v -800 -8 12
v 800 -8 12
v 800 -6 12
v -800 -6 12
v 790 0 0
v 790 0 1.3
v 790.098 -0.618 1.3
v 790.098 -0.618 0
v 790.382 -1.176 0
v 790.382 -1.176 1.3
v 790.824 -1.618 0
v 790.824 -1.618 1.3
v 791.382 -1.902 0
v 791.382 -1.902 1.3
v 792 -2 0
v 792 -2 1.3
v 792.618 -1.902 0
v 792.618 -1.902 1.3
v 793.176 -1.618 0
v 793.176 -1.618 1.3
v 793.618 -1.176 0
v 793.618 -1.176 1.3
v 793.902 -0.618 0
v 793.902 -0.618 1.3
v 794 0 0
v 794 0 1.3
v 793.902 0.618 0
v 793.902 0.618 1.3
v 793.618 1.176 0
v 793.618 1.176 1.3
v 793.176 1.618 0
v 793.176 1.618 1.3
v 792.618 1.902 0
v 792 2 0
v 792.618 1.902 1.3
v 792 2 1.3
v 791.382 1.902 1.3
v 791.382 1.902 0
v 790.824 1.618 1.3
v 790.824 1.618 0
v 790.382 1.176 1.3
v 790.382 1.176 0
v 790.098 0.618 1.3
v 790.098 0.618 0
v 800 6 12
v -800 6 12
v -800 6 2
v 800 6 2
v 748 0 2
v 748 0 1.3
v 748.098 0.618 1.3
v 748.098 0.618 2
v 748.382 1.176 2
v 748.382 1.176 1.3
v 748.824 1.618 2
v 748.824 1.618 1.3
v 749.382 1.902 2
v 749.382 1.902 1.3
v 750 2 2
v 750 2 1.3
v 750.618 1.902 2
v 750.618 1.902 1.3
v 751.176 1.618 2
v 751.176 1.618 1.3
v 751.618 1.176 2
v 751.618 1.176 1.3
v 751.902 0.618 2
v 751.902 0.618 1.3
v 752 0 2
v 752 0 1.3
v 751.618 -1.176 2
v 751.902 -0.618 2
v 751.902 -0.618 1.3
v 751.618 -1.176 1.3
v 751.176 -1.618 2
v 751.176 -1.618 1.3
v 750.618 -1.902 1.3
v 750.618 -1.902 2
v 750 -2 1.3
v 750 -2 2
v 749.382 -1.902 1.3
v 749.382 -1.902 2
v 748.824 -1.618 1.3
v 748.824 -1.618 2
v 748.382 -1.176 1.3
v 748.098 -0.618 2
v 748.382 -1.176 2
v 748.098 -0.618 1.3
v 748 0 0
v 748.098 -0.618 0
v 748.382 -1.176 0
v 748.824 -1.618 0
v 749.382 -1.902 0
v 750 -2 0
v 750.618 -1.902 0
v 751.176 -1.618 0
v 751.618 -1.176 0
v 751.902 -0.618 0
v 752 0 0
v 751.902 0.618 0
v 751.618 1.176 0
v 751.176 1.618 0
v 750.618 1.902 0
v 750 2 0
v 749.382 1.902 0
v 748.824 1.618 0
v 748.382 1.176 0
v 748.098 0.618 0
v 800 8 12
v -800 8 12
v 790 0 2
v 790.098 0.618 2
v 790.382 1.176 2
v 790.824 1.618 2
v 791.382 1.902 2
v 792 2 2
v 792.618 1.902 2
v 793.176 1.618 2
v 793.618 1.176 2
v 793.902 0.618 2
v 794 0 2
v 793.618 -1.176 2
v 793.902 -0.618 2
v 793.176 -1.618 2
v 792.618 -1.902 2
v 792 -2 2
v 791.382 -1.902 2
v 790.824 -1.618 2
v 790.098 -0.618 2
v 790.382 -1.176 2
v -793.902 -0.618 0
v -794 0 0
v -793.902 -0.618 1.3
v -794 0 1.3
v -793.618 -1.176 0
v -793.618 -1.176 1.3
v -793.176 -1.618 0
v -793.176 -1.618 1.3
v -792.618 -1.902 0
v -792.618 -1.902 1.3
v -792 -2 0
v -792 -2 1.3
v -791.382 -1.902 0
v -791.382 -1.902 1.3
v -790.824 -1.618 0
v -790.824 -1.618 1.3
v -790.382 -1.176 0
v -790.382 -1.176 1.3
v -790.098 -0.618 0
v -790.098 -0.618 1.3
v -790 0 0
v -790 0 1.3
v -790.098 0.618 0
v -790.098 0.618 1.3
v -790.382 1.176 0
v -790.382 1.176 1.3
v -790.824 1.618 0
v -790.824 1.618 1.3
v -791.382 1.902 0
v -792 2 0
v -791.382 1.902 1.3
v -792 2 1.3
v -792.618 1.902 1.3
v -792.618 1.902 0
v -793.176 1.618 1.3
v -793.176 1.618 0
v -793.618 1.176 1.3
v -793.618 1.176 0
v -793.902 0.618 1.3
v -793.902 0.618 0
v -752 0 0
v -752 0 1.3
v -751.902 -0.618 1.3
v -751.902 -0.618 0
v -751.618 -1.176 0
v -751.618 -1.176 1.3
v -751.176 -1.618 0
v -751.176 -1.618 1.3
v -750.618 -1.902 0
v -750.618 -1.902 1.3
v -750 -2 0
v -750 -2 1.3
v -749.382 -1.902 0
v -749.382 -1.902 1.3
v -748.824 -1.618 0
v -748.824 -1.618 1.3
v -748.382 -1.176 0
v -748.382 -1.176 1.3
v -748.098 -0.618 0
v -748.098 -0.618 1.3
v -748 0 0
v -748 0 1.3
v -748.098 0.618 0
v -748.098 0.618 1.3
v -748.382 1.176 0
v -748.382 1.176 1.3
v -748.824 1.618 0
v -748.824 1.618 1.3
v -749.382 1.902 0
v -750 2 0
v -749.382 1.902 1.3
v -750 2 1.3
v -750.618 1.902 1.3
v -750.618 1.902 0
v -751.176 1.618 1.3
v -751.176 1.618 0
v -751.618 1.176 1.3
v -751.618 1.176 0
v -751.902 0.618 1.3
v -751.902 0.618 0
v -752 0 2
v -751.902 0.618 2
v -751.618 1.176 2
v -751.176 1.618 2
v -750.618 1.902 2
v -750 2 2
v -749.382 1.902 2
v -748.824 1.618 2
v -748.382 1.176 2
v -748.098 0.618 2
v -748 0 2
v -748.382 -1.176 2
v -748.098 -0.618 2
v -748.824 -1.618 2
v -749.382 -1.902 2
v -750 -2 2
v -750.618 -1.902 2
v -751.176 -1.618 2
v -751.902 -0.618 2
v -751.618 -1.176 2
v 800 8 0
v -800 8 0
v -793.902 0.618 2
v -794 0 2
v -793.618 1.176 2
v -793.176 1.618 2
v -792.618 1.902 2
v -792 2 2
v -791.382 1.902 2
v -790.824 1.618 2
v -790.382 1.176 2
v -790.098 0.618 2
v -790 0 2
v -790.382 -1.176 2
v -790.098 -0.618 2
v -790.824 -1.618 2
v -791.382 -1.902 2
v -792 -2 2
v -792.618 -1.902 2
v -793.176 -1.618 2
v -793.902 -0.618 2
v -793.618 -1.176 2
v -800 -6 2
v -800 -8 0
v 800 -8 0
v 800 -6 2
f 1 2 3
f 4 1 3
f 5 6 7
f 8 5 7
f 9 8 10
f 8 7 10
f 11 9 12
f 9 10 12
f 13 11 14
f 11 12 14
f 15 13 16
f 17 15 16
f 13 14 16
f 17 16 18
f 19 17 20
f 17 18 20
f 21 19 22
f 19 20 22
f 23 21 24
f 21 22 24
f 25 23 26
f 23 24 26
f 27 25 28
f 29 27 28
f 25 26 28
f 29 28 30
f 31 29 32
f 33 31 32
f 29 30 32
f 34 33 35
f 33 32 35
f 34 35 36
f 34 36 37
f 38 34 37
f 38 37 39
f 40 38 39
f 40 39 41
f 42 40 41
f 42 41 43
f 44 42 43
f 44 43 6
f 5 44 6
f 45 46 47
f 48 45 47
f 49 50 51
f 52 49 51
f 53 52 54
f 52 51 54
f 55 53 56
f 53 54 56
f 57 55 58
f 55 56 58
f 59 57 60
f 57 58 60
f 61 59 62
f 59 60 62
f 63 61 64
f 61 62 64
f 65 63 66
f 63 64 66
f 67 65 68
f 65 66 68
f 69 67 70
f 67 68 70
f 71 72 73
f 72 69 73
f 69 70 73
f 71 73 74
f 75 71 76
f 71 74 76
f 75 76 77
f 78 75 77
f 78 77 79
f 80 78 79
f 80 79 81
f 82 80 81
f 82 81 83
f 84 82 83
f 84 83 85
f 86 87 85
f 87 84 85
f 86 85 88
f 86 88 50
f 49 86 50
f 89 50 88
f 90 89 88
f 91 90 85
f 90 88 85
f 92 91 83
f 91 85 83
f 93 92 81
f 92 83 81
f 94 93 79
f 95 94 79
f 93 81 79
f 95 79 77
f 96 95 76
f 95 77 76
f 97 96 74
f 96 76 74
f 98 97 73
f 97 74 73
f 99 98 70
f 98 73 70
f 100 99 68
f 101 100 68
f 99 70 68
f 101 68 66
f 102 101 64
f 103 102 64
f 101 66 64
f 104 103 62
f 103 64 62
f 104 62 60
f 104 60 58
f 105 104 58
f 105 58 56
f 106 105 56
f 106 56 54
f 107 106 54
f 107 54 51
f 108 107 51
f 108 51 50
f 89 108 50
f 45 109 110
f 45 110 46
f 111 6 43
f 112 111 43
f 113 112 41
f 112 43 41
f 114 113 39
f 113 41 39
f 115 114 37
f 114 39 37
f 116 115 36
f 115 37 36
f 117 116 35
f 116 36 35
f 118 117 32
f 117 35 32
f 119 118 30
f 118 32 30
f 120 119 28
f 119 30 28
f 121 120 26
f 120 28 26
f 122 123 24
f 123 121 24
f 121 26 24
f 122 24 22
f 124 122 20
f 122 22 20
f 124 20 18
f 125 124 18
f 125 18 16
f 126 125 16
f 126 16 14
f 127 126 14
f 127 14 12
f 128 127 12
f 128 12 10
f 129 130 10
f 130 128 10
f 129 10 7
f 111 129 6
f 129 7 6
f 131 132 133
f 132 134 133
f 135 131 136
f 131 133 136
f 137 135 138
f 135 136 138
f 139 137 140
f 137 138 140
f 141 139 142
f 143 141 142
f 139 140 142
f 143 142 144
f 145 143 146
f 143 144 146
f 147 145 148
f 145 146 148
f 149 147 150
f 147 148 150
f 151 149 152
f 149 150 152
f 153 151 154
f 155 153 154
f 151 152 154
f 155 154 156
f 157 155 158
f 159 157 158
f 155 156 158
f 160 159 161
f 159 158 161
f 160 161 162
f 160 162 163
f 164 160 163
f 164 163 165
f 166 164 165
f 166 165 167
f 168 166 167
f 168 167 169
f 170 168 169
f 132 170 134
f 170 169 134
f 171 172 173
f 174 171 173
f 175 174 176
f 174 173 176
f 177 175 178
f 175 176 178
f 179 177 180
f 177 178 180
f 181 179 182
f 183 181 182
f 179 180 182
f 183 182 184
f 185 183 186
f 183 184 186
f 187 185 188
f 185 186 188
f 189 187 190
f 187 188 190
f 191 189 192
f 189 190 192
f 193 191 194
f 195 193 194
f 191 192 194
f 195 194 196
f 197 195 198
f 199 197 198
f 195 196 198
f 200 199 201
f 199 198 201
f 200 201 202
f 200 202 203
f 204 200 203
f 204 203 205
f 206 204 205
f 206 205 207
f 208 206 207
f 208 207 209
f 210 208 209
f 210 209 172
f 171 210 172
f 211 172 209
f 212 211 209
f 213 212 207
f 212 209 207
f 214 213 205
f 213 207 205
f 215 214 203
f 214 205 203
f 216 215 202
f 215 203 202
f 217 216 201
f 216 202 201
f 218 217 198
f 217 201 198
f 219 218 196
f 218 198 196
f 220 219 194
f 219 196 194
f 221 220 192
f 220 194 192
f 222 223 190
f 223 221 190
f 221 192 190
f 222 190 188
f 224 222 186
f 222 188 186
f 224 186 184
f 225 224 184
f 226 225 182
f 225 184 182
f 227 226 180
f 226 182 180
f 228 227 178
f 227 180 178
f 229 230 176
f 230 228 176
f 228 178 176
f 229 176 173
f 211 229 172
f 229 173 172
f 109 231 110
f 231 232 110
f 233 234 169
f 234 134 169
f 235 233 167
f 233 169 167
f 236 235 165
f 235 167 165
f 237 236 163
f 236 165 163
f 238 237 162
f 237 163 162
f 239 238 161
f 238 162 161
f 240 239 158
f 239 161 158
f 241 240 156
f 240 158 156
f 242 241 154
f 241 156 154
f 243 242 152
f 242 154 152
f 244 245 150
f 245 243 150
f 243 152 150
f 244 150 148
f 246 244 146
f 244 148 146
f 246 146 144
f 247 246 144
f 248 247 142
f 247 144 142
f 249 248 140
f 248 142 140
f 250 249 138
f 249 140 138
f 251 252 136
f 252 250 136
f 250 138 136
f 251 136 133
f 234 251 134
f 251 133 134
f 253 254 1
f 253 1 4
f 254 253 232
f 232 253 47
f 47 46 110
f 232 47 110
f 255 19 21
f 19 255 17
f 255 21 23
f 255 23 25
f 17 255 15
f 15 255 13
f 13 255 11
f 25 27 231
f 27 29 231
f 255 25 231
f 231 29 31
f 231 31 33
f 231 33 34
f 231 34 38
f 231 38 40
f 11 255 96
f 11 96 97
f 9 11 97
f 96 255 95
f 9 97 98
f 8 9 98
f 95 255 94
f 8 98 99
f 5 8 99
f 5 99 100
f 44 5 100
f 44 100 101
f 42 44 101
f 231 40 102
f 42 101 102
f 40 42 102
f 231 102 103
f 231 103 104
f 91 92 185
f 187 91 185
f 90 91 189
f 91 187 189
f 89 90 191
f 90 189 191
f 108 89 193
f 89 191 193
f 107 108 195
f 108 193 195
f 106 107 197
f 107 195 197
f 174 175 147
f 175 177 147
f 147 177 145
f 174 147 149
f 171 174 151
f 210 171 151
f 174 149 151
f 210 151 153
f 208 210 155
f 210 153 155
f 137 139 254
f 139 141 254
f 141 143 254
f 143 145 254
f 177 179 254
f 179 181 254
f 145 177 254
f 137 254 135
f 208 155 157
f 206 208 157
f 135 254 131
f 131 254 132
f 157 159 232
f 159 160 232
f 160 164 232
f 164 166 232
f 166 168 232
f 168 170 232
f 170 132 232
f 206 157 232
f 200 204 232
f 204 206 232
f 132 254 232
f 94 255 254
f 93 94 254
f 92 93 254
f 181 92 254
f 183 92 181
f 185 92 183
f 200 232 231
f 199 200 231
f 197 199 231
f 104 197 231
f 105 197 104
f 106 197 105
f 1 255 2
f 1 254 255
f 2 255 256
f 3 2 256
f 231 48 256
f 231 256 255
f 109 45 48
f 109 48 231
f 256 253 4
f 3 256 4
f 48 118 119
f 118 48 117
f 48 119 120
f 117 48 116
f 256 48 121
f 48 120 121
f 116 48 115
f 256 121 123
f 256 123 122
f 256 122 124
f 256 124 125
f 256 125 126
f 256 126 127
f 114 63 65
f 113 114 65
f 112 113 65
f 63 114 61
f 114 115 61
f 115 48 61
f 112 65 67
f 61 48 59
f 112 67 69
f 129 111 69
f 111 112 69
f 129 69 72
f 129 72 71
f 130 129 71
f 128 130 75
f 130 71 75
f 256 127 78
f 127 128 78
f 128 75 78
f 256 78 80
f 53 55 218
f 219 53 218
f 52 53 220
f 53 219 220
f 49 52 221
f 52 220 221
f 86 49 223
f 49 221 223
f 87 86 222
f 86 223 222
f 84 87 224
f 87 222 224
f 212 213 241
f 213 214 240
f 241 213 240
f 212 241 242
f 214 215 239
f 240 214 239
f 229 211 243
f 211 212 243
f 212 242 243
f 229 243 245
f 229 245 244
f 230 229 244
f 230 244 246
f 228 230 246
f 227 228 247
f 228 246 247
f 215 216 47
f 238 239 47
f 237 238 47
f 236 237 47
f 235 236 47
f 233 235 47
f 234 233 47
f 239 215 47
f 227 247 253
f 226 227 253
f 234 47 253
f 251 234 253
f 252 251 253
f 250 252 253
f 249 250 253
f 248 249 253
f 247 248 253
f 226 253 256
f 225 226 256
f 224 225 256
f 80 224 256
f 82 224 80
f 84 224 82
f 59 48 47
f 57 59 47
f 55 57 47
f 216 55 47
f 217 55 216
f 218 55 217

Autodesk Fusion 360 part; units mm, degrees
sketch "Sketch1" plane through (0, 0, 0) normal (1, 0, 0) x (0, 1, 0)
  line L0 (-8, 0) -> (8, 0)
  line L1 (8, 0) -> (8, 12)
  line L2 (8, 12) -> (6, 12)
  line L3 (-8, 0) -> (-8, 12)
  line L4 (-8, 12) -> (-6, 12)
  line L5 (6, 12) -> (6, 2)
  line L6 (6, 2) -> (-6, 2)
  line L7 (-6, 2) -> (-6, 12)
  dimension "d26" = 16
  dimension "d27" = 12
  dimension "d28" = 2
  dimension "d29" = 12
  dimension "d30" = 2
  dimension "d31" = 10
  dimension "d32" = 12
  dimension "d33" = 10
sketch "Sketch2" plane through (0, 0, 1.3) normal (0, 0, 1) x (-1, 0, 0)
  line L0 (800, 3) -> (-800, 3)
  line L1 (-800, 3) -> (-800, -3)
  line L2 (-800, -3) -> (800, -3)
  line L3 (800, -3) -> (800, 3)
  line L4 (800, 0) -> (792, 0) construction
  circle A0 centre (792, 0) radius 2
  line L5 (792, 0) -> (750, 0) construction
  circle A1 centre (750, 0) radius 2
  line L6 (-800, 0) -> (-792, 0) construction
  circle A2 centre (-792, 0) radius 2
  line L7 (-792, 0) -> (-750, 0) construction
  circle A3 centre (-750, 0) radius 2
  dimension "d14" = 8
  dimension "d15" = 4
  dimension "d16" = 42
  dimension "d17" = 4
  dimension "d18" = 8
  dimension "d19" = 4
  dimension "d20" = 42
  dimension "d21" = 4
extrude "Extrude3" add sketch "Sketch1" along normal mid plane 1600
extrude "Extrude4" cut sketch "Sketch2" along normal blind 0.7 and the other way blind 1.3 contours A0 | A1 | A2 | A3
